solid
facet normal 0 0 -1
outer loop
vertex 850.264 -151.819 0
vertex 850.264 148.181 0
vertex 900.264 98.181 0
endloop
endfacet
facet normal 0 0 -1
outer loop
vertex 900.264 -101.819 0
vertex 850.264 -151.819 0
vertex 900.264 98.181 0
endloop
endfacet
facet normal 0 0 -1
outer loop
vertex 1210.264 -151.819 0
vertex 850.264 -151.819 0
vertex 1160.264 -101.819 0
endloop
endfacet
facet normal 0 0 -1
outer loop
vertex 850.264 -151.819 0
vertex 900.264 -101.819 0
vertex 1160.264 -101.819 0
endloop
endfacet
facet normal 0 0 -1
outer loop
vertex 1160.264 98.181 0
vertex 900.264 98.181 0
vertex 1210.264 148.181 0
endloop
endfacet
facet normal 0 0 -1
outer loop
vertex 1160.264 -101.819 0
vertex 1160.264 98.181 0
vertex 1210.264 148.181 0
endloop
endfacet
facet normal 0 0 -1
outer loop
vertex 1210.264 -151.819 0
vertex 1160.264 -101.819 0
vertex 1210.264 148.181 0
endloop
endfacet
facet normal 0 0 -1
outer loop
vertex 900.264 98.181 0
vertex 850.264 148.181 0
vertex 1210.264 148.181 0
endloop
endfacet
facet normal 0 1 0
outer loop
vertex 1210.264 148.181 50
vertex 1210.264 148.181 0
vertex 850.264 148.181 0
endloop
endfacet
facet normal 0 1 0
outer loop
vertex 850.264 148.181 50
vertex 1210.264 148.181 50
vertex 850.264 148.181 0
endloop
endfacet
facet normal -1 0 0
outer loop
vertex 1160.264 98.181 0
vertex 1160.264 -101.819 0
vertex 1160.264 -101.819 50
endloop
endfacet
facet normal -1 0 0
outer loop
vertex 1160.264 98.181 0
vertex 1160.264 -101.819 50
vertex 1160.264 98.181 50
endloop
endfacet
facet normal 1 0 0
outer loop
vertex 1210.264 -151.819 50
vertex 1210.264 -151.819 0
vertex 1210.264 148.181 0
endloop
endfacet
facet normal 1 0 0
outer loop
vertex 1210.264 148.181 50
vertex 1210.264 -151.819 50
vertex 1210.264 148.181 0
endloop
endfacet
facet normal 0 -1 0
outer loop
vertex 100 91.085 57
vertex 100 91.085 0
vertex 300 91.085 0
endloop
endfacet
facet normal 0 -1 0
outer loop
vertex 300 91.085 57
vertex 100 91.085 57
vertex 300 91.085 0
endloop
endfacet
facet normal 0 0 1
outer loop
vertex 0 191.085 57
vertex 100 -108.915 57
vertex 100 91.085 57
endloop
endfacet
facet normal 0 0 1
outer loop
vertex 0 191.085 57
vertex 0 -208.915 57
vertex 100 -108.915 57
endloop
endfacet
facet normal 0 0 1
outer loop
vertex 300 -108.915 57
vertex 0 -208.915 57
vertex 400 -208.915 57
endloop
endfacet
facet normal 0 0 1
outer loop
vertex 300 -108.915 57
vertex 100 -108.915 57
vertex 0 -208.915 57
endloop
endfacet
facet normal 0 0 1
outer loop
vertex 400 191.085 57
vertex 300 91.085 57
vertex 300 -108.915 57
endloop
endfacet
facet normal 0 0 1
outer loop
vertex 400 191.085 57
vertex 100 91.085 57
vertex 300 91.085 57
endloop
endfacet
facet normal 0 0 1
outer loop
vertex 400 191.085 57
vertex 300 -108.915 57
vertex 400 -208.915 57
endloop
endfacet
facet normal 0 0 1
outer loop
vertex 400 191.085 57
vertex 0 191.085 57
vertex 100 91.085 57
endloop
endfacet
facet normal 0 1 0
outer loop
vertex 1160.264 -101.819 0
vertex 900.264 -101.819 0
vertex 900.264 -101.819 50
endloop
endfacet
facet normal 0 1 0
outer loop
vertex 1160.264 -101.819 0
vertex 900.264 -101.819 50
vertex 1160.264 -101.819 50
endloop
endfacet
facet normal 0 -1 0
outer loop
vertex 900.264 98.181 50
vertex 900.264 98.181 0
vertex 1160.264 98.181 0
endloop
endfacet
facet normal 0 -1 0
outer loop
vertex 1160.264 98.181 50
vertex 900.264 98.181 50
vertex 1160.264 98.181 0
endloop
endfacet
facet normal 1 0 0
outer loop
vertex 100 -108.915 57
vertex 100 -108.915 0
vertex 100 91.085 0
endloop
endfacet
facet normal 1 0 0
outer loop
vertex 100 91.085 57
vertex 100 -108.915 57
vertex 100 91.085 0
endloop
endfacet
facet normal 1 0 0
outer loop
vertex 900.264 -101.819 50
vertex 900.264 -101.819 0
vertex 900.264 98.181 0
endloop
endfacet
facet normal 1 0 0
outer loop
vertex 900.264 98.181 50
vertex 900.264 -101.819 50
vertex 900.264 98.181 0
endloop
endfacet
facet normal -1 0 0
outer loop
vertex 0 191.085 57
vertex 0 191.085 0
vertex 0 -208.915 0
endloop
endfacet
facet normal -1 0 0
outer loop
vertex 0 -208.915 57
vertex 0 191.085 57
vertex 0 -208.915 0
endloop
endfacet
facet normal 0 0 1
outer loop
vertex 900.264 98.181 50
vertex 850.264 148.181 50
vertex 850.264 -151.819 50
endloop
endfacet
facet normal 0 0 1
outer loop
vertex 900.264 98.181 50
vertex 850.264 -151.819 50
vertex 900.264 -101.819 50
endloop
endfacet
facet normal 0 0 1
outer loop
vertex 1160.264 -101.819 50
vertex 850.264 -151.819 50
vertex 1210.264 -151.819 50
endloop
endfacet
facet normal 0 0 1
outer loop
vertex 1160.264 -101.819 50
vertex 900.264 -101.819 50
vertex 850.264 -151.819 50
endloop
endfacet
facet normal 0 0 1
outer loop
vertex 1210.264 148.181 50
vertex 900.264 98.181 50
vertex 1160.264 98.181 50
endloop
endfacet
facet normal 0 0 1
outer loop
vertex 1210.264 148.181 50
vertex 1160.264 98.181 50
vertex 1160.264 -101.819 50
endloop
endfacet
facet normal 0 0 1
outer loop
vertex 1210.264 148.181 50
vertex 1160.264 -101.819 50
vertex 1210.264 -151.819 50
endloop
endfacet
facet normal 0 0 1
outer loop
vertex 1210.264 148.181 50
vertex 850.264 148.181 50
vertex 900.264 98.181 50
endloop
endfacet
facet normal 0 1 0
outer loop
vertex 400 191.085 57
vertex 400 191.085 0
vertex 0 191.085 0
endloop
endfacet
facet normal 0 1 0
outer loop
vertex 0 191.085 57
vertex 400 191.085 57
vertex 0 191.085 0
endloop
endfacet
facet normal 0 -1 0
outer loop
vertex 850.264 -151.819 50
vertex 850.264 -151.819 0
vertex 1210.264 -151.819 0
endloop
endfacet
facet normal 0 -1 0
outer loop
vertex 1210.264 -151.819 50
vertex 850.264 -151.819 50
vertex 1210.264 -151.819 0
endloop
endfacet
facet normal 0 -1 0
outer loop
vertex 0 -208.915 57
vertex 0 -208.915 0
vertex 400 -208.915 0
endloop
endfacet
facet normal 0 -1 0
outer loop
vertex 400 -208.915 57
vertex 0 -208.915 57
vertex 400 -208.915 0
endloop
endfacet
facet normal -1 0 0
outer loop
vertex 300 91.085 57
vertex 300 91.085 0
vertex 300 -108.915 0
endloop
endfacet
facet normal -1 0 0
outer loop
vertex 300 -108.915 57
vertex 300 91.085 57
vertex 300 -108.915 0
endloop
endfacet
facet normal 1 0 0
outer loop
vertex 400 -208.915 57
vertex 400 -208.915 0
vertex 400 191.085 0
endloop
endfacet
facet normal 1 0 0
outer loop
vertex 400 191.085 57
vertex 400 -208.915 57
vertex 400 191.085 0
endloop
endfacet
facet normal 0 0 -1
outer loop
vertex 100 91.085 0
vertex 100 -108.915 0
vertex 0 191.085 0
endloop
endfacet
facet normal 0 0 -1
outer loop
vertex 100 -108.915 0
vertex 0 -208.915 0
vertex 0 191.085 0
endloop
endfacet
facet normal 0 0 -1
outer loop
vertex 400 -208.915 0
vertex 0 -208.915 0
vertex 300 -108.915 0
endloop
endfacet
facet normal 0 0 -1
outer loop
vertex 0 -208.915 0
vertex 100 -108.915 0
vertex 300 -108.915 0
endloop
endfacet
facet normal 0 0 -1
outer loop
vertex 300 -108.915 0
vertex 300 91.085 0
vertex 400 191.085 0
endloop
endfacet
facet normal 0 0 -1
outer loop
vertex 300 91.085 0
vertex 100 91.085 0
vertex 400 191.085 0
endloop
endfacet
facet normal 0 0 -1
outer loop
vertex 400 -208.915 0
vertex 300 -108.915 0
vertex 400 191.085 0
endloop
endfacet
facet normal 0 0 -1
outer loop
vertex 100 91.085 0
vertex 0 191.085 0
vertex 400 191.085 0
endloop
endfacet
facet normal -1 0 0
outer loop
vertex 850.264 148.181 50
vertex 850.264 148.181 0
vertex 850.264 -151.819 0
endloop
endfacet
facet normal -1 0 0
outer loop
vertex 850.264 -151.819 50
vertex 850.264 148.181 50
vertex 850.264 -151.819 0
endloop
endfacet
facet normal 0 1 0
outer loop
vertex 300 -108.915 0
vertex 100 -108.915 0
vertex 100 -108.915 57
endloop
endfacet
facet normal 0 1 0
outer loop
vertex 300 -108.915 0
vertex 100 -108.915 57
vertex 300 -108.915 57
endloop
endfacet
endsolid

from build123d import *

# Parameters (mm, degrees)
F0_W     = 200
F0_H     = 100
F1_DEPTH = 57
F2_W     = 50
F2_H     = 50
F2_W_2   = 260
F2_H_2   = 200
F3_DEPTH = 50


with BuildPart() as f1:
    # F0 (on Top) → F1 (new body)
    with BuildSketch(Plane.XY):
        Polygon((100, 91.085348), (100, 191.085348), (0, 191.085348), (0, -208.914652), (100, -208.914652), (100, -108.914652), align=None)
        Polygon((400, -208.914652), (400, 191.085348), (300, 191.085348), (300, 91.085348), (300, -108.914652), (300, -208.914652), align=None)
        with Locations((200, -158.914652)):
            Rectangle(F0_W, F0_H)
        with Locations((200, 141.085348)):
            Rectangle(F0_W, F0_H)
    extrude(amount=F1_DEPTH)


with BuildPart() as f3:
    # F2 (on Top) → F3 (new body)
    with BuildSketch(Plane.XY):
        with Locations((875.264359, 123.18103)):
            Rectangle(F2_W, F2_H)
        with Locations((1030.264359, 123.18103)):
            Rectangle(F2_W_2, F2_H)
        with Locations((875.264359, -1.81897)):
            Rectangle(F2_W, F2_H_2)
        with Locations((1185.264359, 123.18103)):
            Rectangle(F2_W, F2_H)
        with Locations((875.264359, -126.81897)):
            Rectangle(F2_W, F2_H)
        with Locations((1030.264359, -126.81897)):
            Rectangle(F2_W_2, F2_H)
        with Locations((1185.264359, -1.81897)):
            Rectangle(F2_W, F2_H_2)
        with Locations((1185.264359, -126.81897)):
            Rectangle(F2_W, F2_H)
    extrude(amount=F3_DEPTH)


solid = Compound([f1.part, f3.part])
